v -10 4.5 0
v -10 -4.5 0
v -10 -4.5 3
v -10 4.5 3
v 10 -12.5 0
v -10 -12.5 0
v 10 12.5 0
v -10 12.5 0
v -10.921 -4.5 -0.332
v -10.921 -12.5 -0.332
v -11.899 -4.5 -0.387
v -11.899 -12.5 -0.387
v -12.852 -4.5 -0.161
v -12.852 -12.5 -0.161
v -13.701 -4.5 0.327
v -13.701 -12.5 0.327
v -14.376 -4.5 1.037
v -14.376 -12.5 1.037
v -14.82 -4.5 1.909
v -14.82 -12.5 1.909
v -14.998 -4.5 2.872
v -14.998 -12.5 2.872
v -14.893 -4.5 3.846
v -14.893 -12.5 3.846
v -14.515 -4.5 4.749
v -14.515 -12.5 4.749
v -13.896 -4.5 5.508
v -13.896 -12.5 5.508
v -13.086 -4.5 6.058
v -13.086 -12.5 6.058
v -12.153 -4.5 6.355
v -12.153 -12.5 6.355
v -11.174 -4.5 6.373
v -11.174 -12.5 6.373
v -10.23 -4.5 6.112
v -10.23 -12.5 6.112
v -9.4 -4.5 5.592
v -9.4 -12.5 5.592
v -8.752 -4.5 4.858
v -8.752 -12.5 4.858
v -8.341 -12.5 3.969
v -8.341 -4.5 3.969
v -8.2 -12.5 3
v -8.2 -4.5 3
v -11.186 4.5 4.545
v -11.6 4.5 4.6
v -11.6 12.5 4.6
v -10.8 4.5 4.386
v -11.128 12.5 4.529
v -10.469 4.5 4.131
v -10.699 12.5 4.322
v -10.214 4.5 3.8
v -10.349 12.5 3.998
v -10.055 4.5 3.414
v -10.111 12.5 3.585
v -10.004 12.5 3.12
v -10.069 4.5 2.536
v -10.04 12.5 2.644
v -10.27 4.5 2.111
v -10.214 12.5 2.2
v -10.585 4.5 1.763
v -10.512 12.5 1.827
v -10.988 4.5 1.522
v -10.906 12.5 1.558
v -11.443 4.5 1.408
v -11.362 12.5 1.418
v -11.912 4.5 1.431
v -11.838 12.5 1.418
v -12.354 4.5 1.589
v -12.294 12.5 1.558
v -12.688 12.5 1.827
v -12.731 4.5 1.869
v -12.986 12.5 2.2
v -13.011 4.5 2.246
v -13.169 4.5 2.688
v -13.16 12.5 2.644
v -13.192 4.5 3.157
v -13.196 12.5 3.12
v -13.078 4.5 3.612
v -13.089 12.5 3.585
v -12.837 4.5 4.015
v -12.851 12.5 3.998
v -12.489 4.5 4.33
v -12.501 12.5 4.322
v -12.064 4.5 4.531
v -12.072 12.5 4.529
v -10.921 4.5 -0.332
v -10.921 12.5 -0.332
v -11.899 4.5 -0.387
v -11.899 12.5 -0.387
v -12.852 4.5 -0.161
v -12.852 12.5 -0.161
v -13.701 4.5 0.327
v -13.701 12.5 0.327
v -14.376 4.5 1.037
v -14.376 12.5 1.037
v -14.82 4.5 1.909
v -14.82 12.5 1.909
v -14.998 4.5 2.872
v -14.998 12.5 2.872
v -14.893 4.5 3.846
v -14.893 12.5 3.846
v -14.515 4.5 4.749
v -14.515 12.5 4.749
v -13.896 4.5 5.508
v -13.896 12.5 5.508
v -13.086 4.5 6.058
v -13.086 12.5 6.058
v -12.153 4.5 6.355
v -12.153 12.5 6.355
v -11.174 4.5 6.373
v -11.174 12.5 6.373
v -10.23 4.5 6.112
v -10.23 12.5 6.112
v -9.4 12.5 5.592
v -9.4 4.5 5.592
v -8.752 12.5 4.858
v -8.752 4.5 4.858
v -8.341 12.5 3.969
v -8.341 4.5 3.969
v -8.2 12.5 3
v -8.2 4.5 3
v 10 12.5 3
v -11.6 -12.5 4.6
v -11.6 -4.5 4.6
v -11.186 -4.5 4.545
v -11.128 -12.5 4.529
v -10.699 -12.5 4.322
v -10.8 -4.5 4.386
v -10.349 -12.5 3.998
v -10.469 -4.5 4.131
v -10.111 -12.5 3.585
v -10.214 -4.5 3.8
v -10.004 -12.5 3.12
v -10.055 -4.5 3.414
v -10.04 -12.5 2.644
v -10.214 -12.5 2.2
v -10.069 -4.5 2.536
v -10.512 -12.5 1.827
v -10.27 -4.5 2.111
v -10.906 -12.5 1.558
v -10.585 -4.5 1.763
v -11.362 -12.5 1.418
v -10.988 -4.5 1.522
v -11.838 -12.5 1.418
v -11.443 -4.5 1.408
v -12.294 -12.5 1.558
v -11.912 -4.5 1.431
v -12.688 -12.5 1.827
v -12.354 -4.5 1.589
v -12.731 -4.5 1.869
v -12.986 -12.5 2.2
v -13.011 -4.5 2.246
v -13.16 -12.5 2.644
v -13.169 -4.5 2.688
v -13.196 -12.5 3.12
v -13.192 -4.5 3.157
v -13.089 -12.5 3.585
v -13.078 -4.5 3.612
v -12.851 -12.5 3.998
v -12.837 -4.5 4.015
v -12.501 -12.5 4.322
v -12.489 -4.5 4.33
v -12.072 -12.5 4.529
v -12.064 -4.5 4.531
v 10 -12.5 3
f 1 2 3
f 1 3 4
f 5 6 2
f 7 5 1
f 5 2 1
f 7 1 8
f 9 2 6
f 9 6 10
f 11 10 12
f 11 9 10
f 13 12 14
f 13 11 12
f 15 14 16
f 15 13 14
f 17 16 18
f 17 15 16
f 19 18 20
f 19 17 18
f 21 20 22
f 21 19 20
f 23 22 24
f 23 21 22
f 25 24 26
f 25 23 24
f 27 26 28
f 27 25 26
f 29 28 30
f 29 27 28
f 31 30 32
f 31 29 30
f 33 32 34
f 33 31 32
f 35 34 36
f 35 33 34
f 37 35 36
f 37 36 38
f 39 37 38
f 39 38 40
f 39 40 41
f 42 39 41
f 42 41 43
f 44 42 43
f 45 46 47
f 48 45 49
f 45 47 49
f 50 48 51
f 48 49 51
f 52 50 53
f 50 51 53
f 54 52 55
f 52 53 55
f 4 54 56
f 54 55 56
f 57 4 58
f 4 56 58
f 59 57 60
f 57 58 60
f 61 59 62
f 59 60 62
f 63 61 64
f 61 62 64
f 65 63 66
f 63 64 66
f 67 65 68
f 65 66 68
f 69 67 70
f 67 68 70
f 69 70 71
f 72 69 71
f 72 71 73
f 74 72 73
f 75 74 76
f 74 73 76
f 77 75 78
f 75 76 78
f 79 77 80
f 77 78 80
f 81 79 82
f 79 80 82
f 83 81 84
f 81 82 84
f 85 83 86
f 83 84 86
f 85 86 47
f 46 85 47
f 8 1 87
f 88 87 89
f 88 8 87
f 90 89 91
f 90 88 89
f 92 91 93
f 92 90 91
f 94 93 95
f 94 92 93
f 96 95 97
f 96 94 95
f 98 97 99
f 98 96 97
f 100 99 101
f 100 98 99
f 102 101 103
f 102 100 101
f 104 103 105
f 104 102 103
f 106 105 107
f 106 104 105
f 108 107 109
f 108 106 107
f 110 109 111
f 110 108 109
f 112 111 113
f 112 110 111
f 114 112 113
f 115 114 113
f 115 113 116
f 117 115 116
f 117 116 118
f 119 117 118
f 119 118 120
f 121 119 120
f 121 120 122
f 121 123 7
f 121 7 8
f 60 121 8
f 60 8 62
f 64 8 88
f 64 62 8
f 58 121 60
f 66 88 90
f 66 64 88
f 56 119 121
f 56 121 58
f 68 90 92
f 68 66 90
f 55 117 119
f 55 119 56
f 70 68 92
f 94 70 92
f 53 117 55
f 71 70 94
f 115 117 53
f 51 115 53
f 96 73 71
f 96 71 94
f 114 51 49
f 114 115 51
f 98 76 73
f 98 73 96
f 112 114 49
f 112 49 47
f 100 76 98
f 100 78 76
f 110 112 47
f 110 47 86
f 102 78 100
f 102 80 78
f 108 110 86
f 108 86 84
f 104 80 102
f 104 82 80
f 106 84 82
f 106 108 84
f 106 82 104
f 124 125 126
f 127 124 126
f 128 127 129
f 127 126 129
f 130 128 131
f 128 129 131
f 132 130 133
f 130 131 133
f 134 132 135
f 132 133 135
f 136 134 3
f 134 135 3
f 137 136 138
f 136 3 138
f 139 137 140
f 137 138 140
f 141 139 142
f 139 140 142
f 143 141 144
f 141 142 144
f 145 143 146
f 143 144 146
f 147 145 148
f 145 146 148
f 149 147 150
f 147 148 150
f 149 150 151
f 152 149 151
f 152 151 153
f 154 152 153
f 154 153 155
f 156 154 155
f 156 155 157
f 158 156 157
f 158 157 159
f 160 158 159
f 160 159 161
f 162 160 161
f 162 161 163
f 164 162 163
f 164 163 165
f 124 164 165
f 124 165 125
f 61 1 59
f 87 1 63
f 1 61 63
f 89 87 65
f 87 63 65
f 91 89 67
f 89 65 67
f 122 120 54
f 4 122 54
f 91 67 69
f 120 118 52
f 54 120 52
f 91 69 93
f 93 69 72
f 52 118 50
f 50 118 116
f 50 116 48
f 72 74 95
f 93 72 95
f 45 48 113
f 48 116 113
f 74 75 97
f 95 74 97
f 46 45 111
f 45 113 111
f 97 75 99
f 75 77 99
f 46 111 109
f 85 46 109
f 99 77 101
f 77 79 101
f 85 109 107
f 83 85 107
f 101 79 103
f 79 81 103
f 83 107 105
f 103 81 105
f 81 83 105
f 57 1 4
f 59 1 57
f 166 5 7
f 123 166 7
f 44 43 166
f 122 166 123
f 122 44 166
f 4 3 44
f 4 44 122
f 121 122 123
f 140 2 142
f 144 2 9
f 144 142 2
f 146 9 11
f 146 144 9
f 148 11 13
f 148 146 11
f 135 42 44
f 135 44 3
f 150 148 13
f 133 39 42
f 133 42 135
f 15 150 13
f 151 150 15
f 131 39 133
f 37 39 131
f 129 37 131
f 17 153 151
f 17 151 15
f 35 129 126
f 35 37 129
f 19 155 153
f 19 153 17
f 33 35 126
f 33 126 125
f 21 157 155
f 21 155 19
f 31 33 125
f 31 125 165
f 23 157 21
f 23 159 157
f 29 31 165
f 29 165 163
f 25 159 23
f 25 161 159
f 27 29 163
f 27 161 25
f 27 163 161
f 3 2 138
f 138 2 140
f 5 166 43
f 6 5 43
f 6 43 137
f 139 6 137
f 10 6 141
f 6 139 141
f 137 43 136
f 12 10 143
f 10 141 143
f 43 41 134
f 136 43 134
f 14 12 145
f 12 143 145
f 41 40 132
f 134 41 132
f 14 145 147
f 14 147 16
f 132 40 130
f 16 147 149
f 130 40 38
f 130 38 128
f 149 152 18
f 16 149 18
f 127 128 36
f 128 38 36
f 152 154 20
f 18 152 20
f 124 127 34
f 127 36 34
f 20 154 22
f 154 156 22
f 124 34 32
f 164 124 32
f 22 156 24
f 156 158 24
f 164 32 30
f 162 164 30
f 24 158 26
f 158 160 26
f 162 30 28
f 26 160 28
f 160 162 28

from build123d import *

# Parameters (mm, degrees)
SKETCH2_W           = 25
SKETCH2_H           = 20
BOSS_EXTRUDE1_DEPTH = 3
SKETCH3_R           = 3.4
SKETCH3_R_2         = 1.6
BOSS_EXTRUDE2_DEPTH = 8
LPATTERN1_COUNT     = 2
LPATTERN1_PITCH     = 17


with BuildPart() as part:
    # Sketch2 → Boss-Extrude1 (new body)
    with BuildSketch(Plane(origin=(0, 0, 0), x_dir=(0, 1, 0), z_dir=(0, 0, 1))):
        Rectangle(SKETCH2_W, SKETCH2_H)
    extrude(amount=BOSS_EXTRUDE1_DEPTH)

    # Sketch3 → Boss-Extrude2 (add)
    with BuildSketch(Plane(origin=(22.5, 12.5, 0), x_dir=(-1, 0, 0), z_dir=(0, 1, 0))):
        with Locations((34.1, 3)):
            Circle(SKETCH3_R)
        with Locations(Location((34.1, 3, 0), (0, 0, 90))):
            Circle(SKETCH3_R_2, mode=Mode.SUBTRACT)
    boss_extrude2 = extrude(amount=-BOSS_EXTRUDE2_DEPTH)

    # LPattern1: Boss-Extrude2 ×2
    with Locations(*[(0, -i * LPATTERN1_PITCH, 0) for i in range(1, LPATTERN1_COUNT)]):
        add(boss_extrude2)


solid = part.part
